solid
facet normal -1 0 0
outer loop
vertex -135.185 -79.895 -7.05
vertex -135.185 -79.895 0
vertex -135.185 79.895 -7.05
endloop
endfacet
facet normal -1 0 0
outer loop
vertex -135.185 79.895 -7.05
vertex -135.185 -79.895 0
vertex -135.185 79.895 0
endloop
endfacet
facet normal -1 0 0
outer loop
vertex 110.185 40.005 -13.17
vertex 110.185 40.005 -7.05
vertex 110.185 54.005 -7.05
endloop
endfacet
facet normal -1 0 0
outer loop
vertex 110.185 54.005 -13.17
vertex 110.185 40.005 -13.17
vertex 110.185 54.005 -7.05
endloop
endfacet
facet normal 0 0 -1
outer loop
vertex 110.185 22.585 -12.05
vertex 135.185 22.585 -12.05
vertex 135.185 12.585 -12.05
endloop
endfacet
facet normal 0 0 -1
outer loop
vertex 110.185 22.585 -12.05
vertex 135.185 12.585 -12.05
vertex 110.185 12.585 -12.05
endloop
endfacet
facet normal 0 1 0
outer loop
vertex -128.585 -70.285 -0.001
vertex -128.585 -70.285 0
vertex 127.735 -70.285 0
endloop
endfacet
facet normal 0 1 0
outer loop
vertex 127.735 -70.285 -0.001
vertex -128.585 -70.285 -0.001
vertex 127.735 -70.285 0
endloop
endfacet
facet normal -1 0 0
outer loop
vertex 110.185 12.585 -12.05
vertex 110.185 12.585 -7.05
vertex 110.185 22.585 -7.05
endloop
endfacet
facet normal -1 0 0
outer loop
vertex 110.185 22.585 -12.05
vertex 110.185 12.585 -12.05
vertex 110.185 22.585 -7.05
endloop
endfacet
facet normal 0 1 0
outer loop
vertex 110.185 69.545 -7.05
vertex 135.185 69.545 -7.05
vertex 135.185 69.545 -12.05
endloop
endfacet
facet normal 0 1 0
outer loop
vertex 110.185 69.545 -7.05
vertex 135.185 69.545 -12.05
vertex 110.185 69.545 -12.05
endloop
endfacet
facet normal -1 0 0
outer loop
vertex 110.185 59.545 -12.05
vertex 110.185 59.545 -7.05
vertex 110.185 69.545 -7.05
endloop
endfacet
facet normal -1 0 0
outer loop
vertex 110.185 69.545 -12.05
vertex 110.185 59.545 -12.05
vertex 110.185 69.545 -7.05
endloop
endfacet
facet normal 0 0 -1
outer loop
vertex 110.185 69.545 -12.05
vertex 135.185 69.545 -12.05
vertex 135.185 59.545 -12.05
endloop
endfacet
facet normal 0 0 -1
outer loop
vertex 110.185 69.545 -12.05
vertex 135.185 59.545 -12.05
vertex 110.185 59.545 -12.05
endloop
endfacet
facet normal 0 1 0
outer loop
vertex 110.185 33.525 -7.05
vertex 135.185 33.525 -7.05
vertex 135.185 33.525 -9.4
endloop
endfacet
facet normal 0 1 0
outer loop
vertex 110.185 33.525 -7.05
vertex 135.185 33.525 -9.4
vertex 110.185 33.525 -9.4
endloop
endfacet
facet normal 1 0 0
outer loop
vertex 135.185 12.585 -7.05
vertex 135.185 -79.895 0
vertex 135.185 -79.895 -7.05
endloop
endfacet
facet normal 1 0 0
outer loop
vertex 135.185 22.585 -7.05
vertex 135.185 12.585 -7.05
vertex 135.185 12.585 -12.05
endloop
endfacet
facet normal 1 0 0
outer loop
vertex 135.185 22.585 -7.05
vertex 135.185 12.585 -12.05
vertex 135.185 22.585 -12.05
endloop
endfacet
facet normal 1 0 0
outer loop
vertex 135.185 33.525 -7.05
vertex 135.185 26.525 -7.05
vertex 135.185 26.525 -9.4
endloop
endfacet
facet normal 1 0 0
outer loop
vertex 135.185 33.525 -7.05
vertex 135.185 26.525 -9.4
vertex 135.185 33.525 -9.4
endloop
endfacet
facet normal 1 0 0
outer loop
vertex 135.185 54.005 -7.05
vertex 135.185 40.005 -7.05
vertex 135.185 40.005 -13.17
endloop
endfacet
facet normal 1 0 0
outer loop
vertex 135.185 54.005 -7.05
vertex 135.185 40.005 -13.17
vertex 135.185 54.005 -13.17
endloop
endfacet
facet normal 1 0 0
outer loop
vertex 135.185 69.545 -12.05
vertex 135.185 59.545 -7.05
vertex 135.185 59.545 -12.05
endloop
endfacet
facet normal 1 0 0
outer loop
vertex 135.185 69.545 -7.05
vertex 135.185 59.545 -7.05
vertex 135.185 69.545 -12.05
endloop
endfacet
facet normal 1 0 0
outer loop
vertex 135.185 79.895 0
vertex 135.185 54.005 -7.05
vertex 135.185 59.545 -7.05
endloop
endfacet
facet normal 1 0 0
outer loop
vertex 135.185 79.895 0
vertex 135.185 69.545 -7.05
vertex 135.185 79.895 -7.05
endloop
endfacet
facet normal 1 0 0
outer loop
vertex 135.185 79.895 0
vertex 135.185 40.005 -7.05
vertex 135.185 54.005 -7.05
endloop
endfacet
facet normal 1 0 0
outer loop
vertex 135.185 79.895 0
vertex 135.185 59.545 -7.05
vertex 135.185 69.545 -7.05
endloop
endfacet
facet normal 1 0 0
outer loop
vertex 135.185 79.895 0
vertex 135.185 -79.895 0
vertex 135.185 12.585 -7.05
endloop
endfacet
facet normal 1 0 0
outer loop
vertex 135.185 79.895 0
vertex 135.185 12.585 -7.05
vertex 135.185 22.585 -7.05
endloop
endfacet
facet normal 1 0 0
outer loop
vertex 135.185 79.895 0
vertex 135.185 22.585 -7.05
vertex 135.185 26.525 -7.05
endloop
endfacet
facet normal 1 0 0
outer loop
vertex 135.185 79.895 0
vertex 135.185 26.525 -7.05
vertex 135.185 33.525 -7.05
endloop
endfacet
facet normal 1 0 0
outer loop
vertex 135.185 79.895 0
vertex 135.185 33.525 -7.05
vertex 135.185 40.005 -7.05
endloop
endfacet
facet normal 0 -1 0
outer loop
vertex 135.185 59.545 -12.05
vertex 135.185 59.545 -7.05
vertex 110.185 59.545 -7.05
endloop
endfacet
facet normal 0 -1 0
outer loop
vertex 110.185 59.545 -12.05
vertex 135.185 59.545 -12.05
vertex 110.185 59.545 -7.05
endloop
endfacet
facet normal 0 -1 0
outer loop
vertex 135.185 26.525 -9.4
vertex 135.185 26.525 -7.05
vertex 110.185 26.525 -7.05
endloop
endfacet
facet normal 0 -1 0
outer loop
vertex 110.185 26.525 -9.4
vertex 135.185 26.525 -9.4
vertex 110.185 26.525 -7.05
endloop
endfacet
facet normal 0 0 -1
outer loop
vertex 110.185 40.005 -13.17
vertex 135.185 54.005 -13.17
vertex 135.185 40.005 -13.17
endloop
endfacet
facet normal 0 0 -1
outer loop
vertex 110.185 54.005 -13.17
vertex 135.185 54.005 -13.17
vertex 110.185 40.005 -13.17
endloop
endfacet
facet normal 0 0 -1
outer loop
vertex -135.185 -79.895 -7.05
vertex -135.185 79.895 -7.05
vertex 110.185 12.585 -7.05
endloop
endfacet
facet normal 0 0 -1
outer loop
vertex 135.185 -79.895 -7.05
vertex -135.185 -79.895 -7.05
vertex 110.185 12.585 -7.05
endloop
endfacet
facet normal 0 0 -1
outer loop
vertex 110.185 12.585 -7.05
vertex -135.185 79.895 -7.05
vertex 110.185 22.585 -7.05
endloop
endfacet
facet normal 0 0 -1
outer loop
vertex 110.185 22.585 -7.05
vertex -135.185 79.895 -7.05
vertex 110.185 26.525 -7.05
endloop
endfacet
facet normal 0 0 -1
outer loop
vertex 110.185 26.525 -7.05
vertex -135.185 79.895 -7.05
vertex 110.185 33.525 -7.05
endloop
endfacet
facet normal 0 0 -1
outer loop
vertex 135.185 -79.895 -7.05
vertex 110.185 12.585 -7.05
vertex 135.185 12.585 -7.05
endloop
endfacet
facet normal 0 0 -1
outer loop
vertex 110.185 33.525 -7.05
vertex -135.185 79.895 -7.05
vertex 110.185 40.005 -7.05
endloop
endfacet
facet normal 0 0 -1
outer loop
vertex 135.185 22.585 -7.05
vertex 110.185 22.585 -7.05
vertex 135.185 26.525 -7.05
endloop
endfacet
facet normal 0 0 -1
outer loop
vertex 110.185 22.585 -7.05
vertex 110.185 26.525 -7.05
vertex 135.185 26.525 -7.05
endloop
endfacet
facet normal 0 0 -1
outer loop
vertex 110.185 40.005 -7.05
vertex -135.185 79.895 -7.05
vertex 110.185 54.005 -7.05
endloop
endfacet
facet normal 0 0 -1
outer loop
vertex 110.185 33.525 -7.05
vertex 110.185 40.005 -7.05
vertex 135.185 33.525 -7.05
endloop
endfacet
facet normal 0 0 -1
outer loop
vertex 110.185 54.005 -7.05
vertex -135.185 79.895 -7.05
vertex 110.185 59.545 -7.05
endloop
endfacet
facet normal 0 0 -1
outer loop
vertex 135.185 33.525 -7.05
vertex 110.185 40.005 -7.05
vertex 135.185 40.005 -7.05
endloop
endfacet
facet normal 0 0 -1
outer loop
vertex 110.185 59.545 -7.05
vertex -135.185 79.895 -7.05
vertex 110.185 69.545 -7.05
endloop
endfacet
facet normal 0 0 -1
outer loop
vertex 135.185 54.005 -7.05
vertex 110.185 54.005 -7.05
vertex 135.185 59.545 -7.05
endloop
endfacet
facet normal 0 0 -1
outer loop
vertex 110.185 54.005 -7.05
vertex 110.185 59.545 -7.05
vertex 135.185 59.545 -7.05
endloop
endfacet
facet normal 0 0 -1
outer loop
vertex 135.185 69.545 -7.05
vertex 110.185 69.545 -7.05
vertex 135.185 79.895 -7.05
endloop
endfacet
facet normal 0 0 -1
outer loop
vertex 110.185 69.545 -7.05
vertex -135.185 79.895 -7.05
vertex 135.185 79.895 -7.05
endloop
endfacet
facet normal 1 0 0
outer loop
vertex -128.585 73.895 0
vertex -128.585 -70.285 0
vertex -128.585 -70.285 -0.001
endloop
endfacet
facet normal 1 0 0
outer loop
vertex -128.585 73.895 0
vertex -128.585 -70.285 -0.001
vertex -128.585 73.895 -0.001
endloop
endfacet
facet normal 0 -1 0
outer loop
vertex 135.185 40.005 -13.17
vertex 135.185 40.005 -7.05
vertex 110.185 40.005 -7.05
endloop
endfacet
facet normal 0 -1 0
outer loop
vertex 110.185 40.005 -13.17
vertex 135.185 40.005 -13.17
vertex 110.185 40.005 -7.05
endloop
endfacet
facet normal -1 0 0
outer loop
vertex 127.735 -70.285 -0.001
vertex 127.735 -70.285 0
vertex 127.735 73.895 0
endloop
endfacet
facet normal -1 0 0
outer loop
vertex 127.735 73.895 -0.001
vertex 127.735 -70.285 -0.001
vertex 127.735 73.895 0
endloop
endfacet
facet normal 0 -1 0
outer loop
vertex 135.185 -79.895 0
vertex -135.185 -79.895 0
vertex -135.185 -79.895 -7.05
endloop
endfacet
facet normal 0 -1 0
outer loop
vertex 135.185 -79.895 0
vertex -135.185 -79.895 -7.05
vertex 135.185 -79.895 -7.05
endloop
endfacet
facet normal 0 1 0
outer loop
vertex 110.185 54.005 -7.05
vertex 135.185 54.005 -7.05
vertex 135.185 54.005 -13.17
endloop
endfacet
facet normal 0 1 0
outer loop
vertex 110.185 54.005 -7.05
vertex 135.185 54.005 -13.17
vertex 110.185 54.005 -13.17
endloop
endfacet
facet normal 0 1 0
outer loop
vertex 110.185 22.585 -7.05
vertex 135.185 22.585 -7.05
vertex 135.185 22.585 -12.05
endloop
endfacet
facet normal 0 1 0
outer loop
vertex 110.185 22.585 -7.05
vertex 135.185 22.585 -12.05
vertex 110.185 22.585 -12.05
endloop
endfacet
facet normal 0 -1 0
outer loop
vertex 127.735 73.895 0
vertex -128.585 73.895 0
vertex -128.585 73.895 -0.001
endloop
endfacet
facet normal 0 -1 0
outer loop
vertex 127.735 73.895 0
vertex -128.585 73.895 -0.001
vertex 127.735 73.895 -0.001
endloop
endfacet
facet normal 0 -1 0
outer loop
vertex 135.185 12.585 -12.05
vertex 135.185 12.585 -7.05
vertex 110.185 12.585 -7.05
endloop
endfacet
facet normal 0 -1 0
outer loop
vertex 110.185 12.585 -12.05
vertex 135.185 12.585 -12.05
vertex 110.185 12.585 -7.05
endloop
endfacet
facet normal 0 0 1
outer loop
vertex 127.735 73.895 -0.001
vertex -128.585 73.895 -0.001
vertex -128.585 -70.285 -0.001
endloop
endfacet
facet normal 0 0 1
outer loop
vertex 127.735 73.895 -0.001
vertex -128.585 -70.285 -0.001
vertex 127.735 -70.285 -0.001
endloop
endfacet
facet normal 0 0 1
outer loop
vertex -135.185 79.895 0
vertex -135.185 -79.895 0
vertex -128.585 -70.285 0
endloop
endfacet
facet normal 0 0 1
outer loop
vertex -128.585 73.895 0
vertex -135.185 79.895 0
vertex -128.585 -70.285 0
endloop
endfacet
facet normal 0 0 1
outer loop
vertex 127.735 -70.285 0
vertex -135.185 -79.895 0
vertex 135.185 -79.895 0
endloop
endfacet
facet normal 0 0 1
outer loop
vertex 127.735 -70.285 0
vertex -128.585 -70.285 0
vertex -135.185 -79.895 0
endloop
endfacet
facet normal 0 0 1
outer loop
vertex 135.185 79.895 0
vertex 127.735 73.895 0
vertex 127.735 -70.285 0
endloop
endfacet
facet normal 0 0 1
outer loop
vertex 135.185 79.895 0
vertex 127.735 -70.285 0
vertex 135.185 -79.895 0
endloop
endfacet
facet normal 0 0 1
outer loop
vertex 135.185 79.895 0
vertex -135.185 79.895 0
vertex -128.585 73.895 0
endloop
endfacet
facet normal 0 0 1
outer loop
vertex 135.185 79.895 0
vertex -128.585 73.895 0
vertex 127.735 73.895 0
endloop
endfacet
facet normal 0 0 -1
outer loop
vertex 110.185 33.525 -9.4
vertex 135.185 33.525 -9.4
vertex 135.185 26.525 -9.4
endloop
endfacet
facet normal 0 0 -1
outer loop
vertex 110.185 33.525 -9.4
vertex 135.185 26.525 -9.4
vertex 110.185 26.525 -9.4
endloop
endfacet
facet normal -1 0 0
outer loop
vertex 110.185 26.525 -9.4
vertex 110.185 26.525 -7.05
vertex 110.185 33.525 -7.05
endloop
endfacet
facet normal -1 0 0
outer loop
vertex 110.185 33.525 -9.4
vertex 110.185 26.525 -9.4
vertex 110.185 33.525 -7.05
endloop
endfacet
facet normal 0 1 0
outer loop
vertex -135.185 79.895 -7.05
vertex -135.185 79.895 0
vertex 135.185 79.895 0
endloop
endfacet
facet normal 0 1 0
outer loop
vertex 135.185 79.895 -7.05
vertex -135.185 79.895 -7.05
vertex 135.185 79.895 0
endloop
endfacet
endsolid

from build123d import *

# Parameters (mm, degrees)
SKETCH1_W           = 270.37
SKETCH1_H           = 159.79
BOSS_EXTRUDE1_DEPTH = 7.05
SKETCH2_W           = 256.32
SKETCH2_H           = 144.18
CUT_EXTRUDE1_DEPTH  = 0.001
SKETCH3_W           = 25
SKETCH3_H           = 10
BOSS_EXTRUDE3_DEPTH = 5
SKETCH3_3_W         = 25
SKETCH3_3_H         = 14
BOSS_EXTRUDE4_DEPTH = 6.12
SKETCH3_4_W         = 25
SKETCH3_4_H         = 7
BOSS_EXTRUDE5_DEPTH = 2.35
SKETCH3_5_W         = 25
SKETCH3_5_H         = 10
BOSS_EXTRUDE6_DEPTH = 5


with BuildPart() as part:
    # Sketch1 → Boss-Extrude1 (new body)
    with BuildSketch(Plane.XY):
        Rectangle(SKETCH1_W, SKETCH1_H)
    extrude(amount=-BOSS_EXTRUDE1_DEPTH)

    # Sketch2 → Cut-Extrude1 (cut)
    with BuildSketch(Plane.XY):
        with Locations((-0.425, 1.805)):
            Rectangle(SKETCH2_W, SKETCH2_H)
    extrude(amount=-CUT_EXTRUDE1_DEPTH, mode=Mode.SUBTRACT)

    # Sketch3 → Boss-Extrude3 (add)
    with BuildSketch(Plane(origin=(0, 0, -7.05), x_dir=(-1, 0, 0), z_dir=(0, 0, -1))):
        with Locations((-122.685, 64.545)):
            Rectangle(SKETCH3_W, SKETCH3_H)
    extrude(amount=BOSS_EXTRUDE3_DEPTH)

    # Sketch3<3> → Boss-Extrude4 (add)
    with BuildSketch(Plane(origin=(0, 0, -7.05), x_dir=(-1, 0, 0), z_dir=(0, 0, -1))):
        with Locations((-122.685, 47.005)):
            Rectangle(SKETCH3_3_W, SKETCH3_3_H)
    extrude(amount=BOSS_EXTRUDE4_DEPTH)

    # Sketch3<4> → Boss-Extrude5 (add)
    with BuildSketch(Plane(origin=(0, 0, -7.05), x_dir=(-1, 0, 0), z_dir=(0, 0, -1))):
        with Locations((-122.685, 30.025)):
            Rectangle(SKETCH3_4_W, SKETCH3_4_H)
    extrude(amount=BOSS_EXTRUDE5_DEPTH)

    # Sketch3<5> → Boss-Extrude6 (add)
    with BuildSketch(Plane(origin=(0, 0, -7.05), x_dir=(-1, 0, 0), z_dir=(0, 0, -1))):
        with Locations((-122.685, 17.585)):
            Rectangle(SKETCH3_5_W, SKETCH3_5_H)
    extrude(amount=BOSS_EXTRUDE6_DEPTH)


solid = part.part
